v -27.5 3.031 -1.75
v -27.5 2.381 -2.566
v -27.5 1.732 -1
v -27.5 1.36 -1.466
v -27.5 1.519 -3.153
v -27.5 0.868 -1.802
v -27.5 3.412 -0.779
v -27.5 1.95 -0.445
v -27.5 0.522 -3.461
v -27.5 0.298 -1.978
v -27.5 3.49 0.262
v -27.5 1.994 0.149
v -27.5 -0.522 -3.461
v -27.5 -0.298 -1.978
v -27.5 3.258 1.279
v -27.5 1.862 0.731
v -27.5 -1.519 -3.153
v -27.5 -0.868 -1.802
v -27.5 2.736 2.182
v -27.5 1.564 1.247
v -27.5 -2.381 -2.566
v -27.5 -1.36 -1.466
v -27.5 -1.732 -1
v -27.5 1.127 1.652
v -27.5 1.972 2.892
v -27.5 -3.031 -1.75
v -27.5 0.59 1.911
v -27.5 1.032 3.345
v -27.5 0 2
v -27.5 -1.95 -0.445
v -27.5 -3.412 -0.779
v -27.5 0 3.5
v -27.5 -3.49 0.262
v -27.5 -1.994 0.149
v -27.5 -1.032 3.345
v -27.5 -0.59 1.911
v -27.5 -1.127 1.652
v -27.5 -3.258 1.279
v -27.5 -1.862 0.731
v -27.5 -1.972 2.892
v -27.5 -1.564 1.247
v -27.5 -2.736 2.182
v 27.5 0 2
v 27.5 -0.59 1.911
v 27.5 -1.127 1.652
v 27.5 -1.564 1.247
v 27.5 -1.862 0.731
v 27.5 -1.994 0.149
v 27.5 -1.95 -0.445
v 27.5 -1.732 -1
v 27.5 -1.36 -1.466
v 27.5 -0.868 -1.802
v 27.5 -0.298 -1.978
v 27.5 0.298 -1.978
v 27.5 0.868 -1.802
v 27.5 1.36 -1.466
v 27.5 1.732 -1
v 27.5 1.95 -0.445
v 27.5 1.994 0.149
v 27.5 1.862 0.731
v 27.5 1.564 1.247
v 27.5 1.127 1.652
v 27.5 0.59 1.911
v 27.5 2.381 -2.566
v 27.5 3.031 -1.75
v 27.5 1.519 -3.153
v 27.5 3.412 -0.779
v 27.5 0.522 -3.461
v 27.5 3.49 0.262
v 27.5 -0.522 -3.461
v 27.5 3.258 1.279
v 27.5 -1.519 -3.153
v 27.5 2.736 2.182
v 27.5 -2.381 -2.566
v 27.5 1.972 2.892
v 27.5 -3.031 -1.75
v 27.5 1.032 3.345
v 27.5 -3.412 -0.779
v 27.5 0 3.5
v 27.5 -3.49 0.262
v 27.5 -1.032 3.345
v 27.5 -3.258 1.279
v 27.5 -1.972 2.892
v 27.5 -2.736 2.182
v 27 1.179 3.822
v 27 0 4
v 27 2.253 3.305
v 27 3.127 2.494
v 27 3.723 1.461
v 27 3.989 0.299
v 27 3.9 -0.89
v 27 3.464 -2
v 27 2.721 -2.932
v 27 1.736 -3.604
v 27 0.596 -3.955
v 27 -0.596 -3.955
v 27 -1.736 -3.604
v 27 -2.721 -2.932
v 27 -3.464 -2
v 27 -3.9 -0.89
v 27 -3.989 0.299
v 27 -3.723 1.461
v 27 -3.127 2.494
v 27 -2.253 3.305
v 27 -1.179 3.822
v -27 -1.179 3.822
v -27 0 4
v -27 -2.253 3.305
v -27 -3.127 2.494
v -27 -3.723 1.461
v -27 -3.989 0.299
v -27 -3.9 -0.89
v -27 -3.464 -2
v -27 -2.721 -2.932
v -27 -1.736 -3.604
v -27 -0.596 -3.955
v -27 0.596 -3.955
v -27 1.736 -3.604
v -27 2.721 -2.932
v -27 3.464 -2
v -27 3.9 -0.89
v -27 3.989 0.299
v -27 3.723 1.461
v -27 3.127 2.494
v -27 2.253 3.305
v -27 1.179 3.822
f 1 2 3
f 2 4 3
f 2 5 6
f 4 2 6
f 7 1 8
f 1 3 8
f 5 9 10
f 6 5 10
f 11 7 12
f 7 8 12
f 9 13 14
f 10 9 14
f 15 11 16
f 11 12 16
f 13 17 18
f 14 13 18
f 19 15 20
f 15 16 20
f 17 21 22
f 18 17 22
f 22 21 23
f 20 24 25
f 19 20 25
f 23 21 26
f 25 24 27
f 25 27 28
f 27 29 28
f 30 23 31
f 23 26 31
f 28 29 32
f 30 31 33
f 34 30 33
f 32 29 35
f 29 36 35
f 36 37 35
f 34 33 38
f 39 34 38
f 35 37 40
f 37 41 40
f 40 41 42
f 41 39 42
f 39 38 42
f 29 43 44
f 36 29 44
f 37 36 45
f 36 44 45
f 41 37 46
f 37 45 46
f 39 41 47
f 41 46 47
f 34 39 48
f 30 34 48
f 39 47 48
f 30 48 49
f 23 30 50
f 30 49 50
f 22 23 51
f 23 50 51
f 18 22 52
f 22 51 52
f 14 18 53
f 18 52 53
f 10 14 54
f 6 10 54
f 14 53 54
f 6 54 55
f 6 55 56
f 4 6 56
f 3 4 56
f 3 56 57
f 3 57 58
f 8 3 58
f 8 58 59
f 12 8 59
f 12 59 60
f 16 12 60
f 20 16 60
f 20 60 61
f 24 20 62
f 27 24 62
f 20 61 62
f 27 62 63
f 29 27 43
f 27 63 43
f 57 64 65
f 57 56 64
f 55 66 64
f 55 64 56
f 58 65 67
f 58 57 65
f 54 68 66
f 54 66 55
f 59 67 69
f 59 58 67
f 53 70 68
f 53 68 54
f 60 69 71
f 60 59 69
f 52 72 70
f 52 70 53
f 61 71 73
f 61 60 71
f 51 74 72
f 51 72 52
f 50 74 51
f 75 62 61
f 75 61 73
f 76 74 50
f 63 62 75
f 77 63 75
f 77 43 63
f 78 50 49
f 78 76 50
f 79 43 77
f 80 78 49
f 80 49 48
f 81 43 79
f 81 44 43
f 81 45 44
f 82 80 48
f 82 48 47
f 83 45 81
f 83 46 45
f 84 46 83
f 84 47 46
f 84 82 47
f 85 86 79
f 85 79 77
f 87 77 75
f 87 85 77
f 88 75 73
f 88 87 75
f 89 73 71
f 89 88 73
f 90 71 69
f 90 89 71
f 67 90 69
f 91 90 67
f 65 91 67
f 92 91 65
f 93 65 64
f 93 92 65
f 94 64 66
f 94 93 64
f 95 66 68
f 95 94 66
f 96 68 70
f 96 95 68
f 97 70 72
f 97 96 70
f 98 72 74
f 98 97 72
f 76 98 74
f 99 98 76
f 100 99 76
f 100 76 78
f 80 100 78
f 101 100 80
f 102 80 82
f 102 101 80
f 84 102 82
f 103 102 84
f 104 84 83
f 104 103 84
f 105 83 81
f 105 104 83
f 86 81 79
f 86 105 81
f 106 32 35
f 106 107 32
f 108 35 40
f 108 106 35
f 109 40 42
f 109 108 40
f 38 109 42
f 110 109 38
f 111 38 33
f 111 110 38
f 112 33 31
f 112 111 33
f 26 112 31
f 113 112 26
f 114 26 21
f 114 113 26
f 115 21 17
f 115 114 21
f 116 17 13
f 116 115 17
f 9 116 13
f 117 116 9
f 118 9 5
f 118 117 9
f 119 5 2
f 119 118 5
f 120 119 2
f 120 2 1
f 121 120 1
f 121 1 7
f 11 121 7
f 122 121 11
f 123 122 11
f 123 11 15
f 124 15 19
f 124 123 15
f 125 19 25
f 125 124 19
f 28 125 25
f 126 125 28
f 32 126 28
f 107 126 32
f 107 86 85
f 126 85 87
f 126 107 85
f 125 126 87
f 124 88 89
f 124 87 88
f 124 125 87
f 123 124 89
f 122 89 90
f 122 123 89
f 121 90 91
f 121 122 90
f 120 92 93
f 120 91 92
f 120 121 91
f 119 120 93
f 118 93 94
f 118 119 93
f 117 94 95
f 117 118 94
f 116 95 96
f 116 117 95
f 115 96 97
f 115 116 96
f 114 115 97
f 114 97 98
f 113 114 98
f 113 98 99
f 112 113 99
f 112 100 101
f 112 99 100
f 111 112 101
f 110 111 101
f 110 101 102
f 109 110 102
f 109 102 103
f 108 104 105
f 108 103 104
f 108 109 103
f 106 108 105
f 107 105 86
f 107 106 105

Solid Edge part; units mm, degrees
sketch "Sketch1" plane through (0, 0, 0) normal (0, -1, 0) x (1, 0, 0)
  line L0 (27.5, 0) -> (27.5, 4)
  line L1 (27.5, 4) -> (-27.5, 4)
  line L2 (-27.5, 4) -> (-27.5, 0)
  dimension "D1" = 55
revolve "RevolvedProtrusion1" add sketch "Sketch1" angle 360 about axis through (-32.5, 0, 0) along (1, 0, 0)
chamfer "Chamfer1" distance 0.5 angle 45 2 edges at (27.5, 0, -4) (-27.5, 0, -4)
hole "Hole_1" at (-27.5, 0, 0) direction (1, 0, 0) diameter 4 depth 60 tip angle 118
properties material "Polyethylene, low density"
